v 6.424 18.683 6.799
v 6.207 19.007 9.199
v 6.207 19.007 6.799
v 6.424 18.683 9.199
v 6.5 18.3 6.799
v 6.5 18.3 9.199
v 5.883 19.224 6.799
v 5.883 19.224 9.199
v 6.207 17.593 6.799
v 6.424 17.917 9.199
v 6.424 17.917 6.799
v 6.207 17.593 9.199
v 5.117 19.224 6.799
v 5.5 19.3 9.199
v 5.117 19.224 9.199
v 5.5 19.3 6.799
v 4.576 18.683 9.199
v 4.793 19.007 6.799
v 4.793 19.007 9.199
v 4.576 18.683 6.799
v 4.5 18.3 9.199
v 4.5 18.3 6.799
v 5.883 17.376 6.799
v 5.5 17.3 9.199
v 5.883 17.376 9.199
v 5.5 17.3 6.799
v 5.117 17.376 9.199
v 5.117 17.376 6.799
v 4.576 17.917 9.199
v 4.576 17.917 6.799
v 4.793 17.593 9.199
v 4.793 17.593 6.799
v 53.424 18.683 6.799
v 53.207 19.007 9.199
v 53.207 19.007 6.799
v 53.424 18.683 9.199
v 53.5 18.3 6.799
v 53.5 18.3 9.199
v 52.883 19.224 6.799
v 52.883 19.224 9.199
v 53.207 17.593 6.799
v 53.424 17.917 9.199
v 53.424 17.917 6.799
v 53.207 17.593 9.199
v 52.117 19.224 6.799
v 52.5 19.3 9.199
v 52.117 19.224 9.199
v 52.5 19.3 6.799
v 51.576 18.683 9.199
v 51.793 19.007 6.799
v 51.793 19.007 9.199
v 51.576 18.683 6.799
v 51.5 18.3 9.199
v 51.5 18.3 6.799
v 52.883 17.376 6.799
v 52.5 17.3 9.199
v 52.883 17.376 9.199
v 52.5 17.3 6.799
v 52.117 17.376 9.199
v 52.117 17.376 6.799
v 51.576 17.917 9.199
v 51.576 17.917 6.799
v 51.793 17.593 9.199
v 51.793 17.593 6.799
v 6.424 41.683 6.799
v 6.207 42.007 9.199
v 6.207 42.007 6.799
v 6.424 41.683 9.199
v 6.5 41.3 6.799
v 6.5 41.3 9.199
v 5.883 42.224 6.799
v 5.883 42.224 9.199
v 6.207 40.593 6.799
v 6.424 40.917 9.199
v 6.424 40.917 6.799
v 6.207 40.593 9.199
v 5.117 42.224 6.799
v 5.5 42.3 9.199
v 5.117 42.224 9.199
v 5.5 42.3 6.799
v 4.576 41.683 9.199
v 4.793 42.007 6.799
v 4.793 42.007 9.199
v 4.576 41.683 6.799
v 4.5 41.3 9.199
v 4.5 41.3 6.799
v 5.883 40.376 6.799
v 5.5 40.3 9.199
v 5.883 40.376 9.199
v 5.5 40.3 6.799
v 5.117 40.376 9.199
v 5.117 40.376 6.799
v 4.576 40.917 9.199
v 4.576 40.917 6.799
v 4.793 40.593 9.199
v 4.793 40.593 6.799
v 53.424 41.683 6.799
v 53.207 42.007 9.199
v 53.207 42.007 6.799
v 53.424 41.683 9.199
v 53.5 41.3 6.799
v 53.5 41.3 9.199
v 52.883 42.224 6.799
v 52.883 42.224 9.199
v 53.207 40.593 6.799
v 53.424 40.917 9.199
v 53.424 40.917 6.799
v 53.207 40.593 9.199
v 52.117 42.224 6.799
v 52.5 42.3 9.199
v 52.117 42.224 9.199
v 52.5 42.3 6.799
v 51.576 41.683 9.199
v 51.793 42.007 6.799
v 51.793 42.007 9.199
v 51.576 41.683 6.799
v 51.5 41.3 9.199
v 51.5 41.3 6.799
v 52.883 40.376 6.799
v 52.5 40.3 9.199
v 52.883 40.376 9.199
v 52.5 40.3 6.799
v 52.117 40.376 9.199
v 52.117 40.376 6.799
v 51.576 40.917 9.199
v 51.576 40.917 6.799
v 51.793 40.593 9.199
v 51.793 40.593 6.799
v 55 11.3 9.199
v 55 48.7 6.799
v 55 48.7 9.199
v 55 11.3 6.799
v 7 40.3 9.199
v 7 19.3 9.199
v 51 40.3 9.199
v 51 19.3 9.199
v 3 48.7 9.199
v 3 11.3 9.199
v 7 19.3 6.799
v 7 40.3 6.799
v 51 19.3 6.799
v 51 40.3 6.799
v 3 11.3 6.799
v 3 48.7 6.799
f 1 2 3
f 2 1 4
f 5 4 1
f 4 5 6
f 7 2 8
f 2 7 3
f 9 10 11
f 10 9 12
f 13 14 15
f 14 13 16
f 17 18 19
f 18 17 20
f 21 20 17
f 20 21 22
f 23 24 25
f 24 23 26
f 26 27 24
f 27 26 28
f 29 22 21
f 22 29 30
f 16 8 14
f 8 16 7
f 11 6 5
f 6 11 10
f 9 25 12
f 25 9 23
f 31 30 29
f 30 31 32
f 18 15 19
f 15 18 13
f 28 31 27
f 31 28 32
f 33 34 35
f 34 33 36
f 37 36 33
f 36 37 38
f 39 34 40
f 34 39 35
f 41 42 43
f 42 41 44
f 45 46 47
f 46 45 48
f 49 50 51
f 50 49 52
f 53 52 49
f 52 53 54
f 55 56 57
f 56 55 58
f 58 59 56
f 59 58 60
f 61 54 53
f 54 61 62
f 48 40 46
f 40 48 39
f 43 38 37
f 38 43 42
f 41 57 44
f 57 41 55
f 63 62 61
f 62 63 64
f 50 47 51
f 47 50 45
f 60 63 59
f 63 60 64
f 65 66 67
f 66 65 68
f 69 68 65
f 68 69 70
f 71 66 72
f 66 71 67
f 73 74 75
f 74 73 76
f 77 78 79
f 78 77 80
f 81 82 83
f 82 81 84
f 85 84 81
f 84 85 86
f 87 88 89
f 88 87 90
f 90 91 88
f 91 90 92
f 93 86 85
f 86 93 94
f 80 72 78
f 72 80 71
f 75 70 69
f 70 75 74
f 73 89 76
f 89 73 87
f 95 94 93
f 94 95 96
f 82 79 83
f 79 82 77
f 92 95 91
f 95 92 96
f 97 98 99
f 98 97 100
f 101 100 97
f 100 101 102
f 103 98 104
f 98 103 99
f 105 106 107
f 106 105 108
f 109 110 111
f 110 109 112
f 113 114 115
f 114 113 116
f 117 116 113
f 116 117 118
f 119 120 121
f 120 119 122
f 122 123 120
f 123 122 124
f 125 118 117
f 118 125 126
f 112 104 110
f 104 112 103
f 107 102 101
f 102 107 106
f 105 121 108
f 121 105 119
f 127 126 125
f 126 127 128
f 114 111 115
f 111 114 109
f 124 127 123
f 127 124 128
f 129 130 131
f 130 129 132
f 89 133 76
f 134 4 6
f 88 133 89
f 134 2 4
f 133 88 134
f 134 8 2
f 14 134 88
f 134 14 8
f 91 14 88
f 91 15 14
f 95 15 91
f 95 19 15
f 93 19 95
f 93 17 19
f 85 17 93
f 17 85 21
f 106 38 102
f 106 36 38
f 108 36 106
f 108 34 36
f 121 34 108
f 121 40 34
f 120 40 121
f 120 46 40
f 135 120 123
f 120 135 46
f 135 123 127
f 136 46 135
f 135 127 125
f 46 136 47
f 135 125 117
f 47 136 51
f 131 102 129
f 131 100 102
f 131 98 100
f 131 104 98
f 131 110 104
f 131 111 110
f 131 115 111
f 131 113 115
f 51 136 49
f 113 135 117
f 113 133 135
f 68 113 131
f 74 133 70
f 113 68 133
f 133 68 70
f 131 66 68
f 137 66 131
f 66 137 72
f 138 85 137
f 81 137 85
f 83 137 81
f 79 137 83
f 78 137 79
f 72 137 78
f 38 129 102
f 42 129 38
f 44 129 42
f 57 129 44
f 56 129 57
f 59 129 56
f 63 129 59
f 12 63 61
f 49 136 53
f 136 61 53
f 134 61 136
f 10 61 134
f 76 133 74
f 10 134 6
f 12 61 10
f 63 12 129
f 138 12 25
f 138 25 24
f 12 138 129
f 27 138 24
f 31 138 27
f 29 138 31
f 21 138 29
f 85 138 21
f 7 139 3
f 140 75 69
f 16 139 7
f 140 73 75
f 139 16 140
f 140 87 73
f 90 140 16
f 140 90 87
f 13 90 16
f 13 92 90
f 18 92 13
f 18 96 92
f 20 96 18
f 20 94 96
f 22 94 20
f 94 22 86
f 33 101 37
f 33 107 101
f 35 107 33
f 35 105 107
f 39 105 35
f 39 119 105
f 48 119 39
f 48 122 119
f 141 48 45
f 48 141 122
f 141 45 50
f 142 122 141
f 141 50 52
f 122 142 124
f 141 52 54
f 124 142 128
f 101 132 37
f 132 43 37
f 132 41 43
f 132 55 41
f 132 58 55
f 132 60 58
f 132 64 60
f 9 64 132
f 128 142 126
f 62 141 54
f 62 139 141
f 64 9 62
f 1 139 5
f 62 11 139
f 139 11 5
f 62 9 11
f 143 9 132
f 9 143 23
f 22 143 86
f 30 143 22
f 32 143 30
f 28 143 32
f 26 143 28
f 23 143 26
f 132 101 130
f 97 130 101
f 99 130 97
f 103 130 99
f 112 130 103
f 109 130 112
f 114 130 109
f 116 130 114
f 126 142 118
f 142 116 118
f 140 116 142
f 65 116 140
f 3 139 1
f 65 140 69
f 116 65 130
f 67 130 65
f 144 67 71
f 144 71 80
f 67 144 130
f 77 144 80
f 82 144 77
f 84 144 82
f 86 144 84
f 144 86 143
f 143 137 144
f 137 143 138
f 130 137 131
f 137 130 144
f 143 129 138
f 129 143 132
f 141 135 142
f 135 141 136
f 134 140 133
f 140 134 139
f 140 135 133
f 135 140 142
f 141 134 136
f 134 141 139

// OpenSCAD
$fa = 1;
$fs = 0.4;
J = 0.001;

pcbW = 29;          //Width of pcb for esp32
pcbD = 52;          //Depth of pcb for esp32
pcbT = 1.5;           //Thickness of esp32 pcb
holeDw = 23;  //Distance from center to center of mounting holes across pcb width
holeDd = 47;  //Distance from center to center of mounting holes across pcb depth

RR = 5;         //Rounding Radius
wallT = 2;      //Wall Thickness
enclD = pcbD+2*wallT+1;     //Enclosure Depth
enclW = 60;     //Enclosure Width
enclH = 60;     //Enclosure Height
S = enclD*0.5;  //Depth to split the enclosure

pirR = 23*0.5;       //PIR Sensor cutout Radius

lightR = 5*0.5;   //light sensor Radius
lightH=2.5;         //light sensor height
leadW=1;            //light sensor lead width

ledR = 5.5*0.5;       //LED Radius

tabW = 10;      //Width of tabs for holding enclosure together

temphumW=15.5;      //Width of temperature/humidity sensor
temphumH=20.5;      //Height of temperature/humidity sensor
temphumV=10;         //Vertical offset of temperature/humidity sensor

pinR=1.3;                //pin Radius for pcb holder
pinH=6;                //pin Height
holdH=2;                //holder Height
holdW = pcbW+8;      //holder Width
holdD = pcbD;      //holder Depth

supH = 10;            //Support Height
supW = 6;           //Support Width
supD = enclD*0.6;      //Support Depth
supO = 2;            //Support Overlap

usbR=11*0.5;        //Radius of micro usb plug for round hole
usbW = usbR*0.65;   //Width of rectancular micro usb cutout
usbH=wallT+supH*0.5+pcbT+1.5+3;            //Height of center of plug measured from bottom
usbO=enclW*0.5;            //Offset of center of plug from side wall

pinW = 6;           //Width of pin used to hold sensors in place

depthF=0.3;      //light hole cutout location as fraction of enclosure depth

lighttubeD=8;        //Depth of light tube

tabR=0.2;   //Ridge Lock depth and width

pcbside = 7;
pcblockD = 30;     //how deep the lock reaches over the pcb
pcblockH = 13.5;     //height from outside bottom wall to bottom of the square lock

lightsensordepthF=0.3;      //cutout location as fraction of enclosure depth
blockW=lightR*2+6;     //support block Width
blockH=lightH+3;      //support block Height

//pcb holder
pcbCompD = pcbD-8;   //pcb Component Depth
pcbCompW = pcbW-8;   //pcb Component Width
pcbCompH = 5;   //pcb Component Height
cutT = 0.4;       //cutout Tolerance
//SecurePCB = "pins"
// SecurePCB = "rails";
SecurePCB = "screws";
screwR = 1;
railcutoutZoff = 4;   //Z offset from holder to center of rail cutout
pcbholderrailH = railcutoutZoff+pcbT+2;  //
pcbholderrailW = 1.5;
pcbholderrailCD = 0.4; //Cutout Depth for groove that pcb will slide into
//28x49 W:1, D:3
//25.7x49
reducepcbW = 29-25.7;     //for mounting a smaller pcb width
reducepcbD = 3;     //for mounting a smaller pcb depth

//wall mount
wall_mountD = 0.25*enclD+2*wallT;  //Depth
earW = 15;
tol = 0.2;

module enclosure_front(){
    difference(){
        //the enclosure
        minkowski(){
            translate([RR,RR,RR])
            sphere(RR);
            cube([enclD-2*RR,enclW-2*RR,enclH-2*RR]);
        }
        //create the interior of the cube
        minkowski(){
            translate([wallT,wallT,wallT])
            translate([RR,RR,RR])
            sphere(RR);
            cube([enclD-2*RR-2*wallT,enclW-2*RR-2*wallT,enclH-2*RR-2*wallT]);
        }

        //remove the back of the cube to create the front
        translate([S,0-J,0-J])
        cube([S,enclW+2*J,enclH+2*J]);

        //hole for pir sensor
        pir_sensor_cutout();
        //hole for led
//        led_cutout();
        light_sensor_cutout();
    }
    light_sensor_support();
    pcb_top_lock();
}

module enclosure_back(){
    difference(){
        //the enclosure
        minkowski(){
            translate([RR,RR,RR])
            sphere(RR);
            cube([enclD-2*RR,enclW-2*RR,enclH-2*RR]);
        }
        //create the interior of the cube
        minkowski(){
            translate([wallT,wallT,wallT])
            translate([RR,RR,RR])
            sphere(RR);
            cube([enclD-2*RR-2*wallT,enclW-2*RR-2*wallT,enclH-2*RR-2*wallT]);
        }

        //remove the front of the cube to create the front
        translate([0,0-J,0-J])
        cube([S,enclW+2*J,enclH+2*J]);

        //cutout for temperature/humidity sensor
        temphum_sensor_cutout();
        //cutout for micro-usb plug
        //microusb_cutout_round();
        microusb_cutout_rectangular();
        //hole for light sensor
        //light_sensor_cutout();
    }
    //slide the pcb_holder into the groove on these supports
    pcb_supports();
    //light_sensor_tube();
    closure_tabs();
}

module temphum_sensor_cutout(){
    translate([enclD-2*wallT-J,0.5*enclW-0.5*temphumH,enclH*0.5-0.5*temphumW+temphumV])
    cube([2*wallT+2*J,temphumH,temphumW]);
}

module microusb_cutout_round(){
    translate([enclD-2*wallT-J,enclW*0.5,usbH])
    rotate([0,90,0])
    cylinder(2*wallT+2*J,usbR,usbR);
}

module microusb_cutout_rectangular(){
    translate([enclD-2*wallT-J,(enclW-2*usbW)*0.5,usbH+usbW*0.5])
    minkowski(){
        sphere(usbW*0.5);
        {rotate([0,90,0])
        linear_extrude(2*wallT+2*J)
        square([usbW,2*usbW]);}
    }
}
module pir_sensor_cutout(){
    //hole for a round PIR sensor
    translate([0-J,(enclW)*0.5,(enclH)*0.6])
    rotate([0,90,0])
    cylinder(2*wallT+2*J,pirR,pirR);
}

module light_sensor_cutout(){
    //hole in the enclosure for the light sensor
    //top cutout
    translate([enclD*depthF,enclW*0.5,enclH-2*wallT-J])
    //back cutout
//    rotate([0,90,0])
//    translate([-enclH*0.75,enclW*0.5,enclD-2*wallT+J])
    cylinder(2*wallT+2*J,lightR,lightR);
}
module light_sensor_tube(){
    //the light sensor can be recessed in this tube
    //top location
    //translate([enclD*0.7,enclW*0.5,enclH-D])
    //back location
    rotate([0,90,0])
    translate([-enclH*0.75,enclW*0.5,enclD-4*wallT-J])
    difference(){
        cylinder(lighttubeD+2*J,wallT+lightR,wallT+lightR);
        translate([0,0,0-J])
        cylinder(lighttubeD+4*J,lightR,lightR);
    }
}
module led_cutout(){
    //hole for an LED   
    translate([0-J,(enclW)*0.75,(enclH)*0.35])
    rotate([0,90,0])
    cylinder(2*wallT+2*J,ledR,ledR);
    
    translate([0-J,(enclW)*0.25,(enclH)*0.35])
    rotate([0,90,0])
    cylinder(2*wallT+2*J,ledR,ledR);
}
module closure_tabs(){
    //friction tab to hold the front and back of the enclosure together
//    //bottom tab
//    translate([enclD*0.5-W*0.5,1.5*RR,wallT-J])
//    cube([W,enclD-3*RR,wallT]);
    //top tab
    translate([enclD*0.5-tabW*0.5,3*RR,enclH-2*wallT+J])
    cube([tabW,enclD-6*RR,wallT]);
    
    //right tab
    translate([enclD*0.5-tabW*0.5,wallT-J,3*RR])
    cube([tabW,wallT,enclD-6*RR]);
    //add a ridge lock to the tab
    translate([enclD*0.5-tabW*0.4,wallT-J-tabR,3*RR])
    cube([3*tabR,tabR,enclD-6*RR]);
    
    //left tab
    translate([enclD*0.5-tabW*0.5,enclW-2*wallT+J,3*RR])
    cube([tabW,wallT,enclD-6*RR]);
    //add a ridge lock to the tab
    translate([enclD*0.5-tabW*0.4,enclW-1*wallT-J,3*RR])
    cube([3*tabR,tabR,enclD-6*RR]);
}
module pcb_supports(){
    difference(){
        translate([enclD-supD-wallT,enclW*0.5-holdW*0.5-supW+supO,wallT-J]){
        cube([supD,supW,supH]);
        }
        pcb_holder();
    }
    
    difference(){
        translate([enclD-supD-wallT,enclW*0.5+holdW*0.5-supO,wallT-J]){
        cube([supD,supW,supH]);
        }
        pcb_holder();
    }
}

module pcb_top_lock(){
    //when the front and back of the enclosure are put together, this lock will extend over the pcb and keep it from falling off the pcb holder
    translate([0,wallT+enclD*0.5-pcbside*0.5,pcblockH+pcbside])
    rotate([0,90,0])
    linear_extrude(pcblockD)
    square([pcbside,pcbside]);
    
}
module light_sensor_support(){
//The light (cds) sensor will slide into this holder to be positioned under the light sensor cutout
    translate([RR*0.2,enclW*0.5,enclH-wallT+J])
    {
        difference(){
            //holder for light sensor
            translate([0,-blockW*0.5,-blockH])
            cube([enclD*lightsensordepthF+2*lightR-J,blockW,blockH]);
            //remove slot for light sensor
            translate([0,-lightR*2*0.5,-lightH])
            cube([enclD*lightsensordepthF+2*lightR,lightR*2,lightH]);
            //remove slot for leads
            translate([0,-leadW*0.5,-blockH-J])
            cube([enclD*lightsensordepthF+2*lightR,leadW,blockH+J]);
        }
    }
}
module pin(){
//print three pins to hold in place the temp/humidity sensor, the PIR sensor and the light sensor
    translate([0.5*enclD,wallT,0.5*enclH])
    cube([pinW,enclD-2*wallT,pinW]);    
}
module pcb_holder(){    
    //holds the pcb with pins - will be printed separately so that the pins can be printed easily
    translate([enclD-pcbD-wallT,enclW*0.5-holdW*0.5-cutT*0.5,wallT-J+supH*0.5-cutT*0.5])
    union(){
        difference(){
            cube([holdD,holdW+cutT,holdH+cutT]);
            translate([(holdD-pcbCompD)*0.5,(holdW-pcbCompW)*0.5,-J])
            cube([pcbCompD,pcbCompW,pcbCompH]);
            if (SecurePCB == "screws"){
                //screw holes for pcb
                translate([(holdD-holeDd)*0.5,
                            (holdW-holeDw)*0.5,
                            -J])
                cylinder(pcbCompH*2,screwR,screwR);
                    
                translate([holeDd+(holdD-holeDd)*0.5,
                            (holdW-holeDw)*0.5,
                            -J])
                cylinder(pcbCompH*2,screwR,screwR);
                    
                translate([(holdD-holeDd)*0.5,
                            holeDw+(holdW-holeDw)*0.5,
                            -J])
                cylinder(pcbCompH*2,screwR,screwR);
                    
                translate([holeDd+(holdD-holeDd)*0.5,
                            holeDw+(holdW-holeDw)*0.5,
                            -J])
                cylinder(pcbCompH*2,screwR,screwR);
            }
        }
        if (SecurePCB == "pins"){
            //pins to hold pcb
            translate([(holdD-holeDd)*0.5,
                        (holdW-holeDw)*0.5,
                        holdH-J])
            cylinder(pinH,pinR,pinR);
                
            translate([holeDd+(holdD-holeDd)*0.5,
                        (holdW-holeDw)*0.5,
                        holdH-J])
            cylinder(pinH,pinR,pinR);
                
            translate([(holdD-holeDd)*0.5,
                        holeDw+(holdW-holeDw)*0.5,
                        holdH-J])
            cylinder(pinH,pinR,pinR);
                
            translate([holeDd+(holdD-holeDd)*0.5,
                        holeDw+(holdW-holeDw)*0.5,
                        holdH-J])
            cylinder(pinH,pinR,pinR);
        }
        if (SecurePCB == "rails"){
            difference()
            {
                translate([0,0.5*(holdW-pcbW)-pcbholderrailW,holdH])
                cube([holdD,pcbW+2*pcbholderrailW,pcbholderrailH]);
                translate([-J,0.5*(holdW-pcbW+2*pcbholderrailCD+reducepcbW),holdH-J])
                cube([holdD+2*J,pcbW-2*pcbholderrailCD-reducepcbW,pcbholderrailH+2*J]);
                translate([-J+reducepcbD,0.5*(holdW-pcbW+reducepcbW),holdH+railcutoutZoff])
                cube([pcbD+2*J-reducepcbD,pcbW-reducepcbW,pcbT+0.5]);
            }
        }
    }
}

module wall_mount(){

    translate([0.5*enclD-0.5*wall_mountD,-wallT-0.125*RR,-wallT-0.125*RR])
    {
    difference()
    {
        cube([wall_mountD,enclW+2*wallT+0.25*RR,enclH+2*wallT+0.25*RR]);
        translate([-J,wallT+0.125*RR,wallT+0.125*RR])
        cube([wall_mountD+2*J,enclW+tol,enclH+tol]);
    }
        difference()
        {
        translate([0,-earW,0])
        cube([wall_mountD,enclH+2*wallT+0.25*RR+2*earW,wallT]);
        translate([0.5*wall_mountD,enclW+wallT+0.25*RR+0.75*earW,-5])
        cylinder(10,2,2);
        translate([0.5*wall_mountD,wallT+0.25*RR-0.75*earW,-5])
        cylinder(10,2,2);
        }
    }
}





//enclosure_front();
// enclosure_back();

pcb_holder();

//pin();

//light_sensor_tube();
//light_sensor_cutout();
//led_cutout();

//wall_mount();
